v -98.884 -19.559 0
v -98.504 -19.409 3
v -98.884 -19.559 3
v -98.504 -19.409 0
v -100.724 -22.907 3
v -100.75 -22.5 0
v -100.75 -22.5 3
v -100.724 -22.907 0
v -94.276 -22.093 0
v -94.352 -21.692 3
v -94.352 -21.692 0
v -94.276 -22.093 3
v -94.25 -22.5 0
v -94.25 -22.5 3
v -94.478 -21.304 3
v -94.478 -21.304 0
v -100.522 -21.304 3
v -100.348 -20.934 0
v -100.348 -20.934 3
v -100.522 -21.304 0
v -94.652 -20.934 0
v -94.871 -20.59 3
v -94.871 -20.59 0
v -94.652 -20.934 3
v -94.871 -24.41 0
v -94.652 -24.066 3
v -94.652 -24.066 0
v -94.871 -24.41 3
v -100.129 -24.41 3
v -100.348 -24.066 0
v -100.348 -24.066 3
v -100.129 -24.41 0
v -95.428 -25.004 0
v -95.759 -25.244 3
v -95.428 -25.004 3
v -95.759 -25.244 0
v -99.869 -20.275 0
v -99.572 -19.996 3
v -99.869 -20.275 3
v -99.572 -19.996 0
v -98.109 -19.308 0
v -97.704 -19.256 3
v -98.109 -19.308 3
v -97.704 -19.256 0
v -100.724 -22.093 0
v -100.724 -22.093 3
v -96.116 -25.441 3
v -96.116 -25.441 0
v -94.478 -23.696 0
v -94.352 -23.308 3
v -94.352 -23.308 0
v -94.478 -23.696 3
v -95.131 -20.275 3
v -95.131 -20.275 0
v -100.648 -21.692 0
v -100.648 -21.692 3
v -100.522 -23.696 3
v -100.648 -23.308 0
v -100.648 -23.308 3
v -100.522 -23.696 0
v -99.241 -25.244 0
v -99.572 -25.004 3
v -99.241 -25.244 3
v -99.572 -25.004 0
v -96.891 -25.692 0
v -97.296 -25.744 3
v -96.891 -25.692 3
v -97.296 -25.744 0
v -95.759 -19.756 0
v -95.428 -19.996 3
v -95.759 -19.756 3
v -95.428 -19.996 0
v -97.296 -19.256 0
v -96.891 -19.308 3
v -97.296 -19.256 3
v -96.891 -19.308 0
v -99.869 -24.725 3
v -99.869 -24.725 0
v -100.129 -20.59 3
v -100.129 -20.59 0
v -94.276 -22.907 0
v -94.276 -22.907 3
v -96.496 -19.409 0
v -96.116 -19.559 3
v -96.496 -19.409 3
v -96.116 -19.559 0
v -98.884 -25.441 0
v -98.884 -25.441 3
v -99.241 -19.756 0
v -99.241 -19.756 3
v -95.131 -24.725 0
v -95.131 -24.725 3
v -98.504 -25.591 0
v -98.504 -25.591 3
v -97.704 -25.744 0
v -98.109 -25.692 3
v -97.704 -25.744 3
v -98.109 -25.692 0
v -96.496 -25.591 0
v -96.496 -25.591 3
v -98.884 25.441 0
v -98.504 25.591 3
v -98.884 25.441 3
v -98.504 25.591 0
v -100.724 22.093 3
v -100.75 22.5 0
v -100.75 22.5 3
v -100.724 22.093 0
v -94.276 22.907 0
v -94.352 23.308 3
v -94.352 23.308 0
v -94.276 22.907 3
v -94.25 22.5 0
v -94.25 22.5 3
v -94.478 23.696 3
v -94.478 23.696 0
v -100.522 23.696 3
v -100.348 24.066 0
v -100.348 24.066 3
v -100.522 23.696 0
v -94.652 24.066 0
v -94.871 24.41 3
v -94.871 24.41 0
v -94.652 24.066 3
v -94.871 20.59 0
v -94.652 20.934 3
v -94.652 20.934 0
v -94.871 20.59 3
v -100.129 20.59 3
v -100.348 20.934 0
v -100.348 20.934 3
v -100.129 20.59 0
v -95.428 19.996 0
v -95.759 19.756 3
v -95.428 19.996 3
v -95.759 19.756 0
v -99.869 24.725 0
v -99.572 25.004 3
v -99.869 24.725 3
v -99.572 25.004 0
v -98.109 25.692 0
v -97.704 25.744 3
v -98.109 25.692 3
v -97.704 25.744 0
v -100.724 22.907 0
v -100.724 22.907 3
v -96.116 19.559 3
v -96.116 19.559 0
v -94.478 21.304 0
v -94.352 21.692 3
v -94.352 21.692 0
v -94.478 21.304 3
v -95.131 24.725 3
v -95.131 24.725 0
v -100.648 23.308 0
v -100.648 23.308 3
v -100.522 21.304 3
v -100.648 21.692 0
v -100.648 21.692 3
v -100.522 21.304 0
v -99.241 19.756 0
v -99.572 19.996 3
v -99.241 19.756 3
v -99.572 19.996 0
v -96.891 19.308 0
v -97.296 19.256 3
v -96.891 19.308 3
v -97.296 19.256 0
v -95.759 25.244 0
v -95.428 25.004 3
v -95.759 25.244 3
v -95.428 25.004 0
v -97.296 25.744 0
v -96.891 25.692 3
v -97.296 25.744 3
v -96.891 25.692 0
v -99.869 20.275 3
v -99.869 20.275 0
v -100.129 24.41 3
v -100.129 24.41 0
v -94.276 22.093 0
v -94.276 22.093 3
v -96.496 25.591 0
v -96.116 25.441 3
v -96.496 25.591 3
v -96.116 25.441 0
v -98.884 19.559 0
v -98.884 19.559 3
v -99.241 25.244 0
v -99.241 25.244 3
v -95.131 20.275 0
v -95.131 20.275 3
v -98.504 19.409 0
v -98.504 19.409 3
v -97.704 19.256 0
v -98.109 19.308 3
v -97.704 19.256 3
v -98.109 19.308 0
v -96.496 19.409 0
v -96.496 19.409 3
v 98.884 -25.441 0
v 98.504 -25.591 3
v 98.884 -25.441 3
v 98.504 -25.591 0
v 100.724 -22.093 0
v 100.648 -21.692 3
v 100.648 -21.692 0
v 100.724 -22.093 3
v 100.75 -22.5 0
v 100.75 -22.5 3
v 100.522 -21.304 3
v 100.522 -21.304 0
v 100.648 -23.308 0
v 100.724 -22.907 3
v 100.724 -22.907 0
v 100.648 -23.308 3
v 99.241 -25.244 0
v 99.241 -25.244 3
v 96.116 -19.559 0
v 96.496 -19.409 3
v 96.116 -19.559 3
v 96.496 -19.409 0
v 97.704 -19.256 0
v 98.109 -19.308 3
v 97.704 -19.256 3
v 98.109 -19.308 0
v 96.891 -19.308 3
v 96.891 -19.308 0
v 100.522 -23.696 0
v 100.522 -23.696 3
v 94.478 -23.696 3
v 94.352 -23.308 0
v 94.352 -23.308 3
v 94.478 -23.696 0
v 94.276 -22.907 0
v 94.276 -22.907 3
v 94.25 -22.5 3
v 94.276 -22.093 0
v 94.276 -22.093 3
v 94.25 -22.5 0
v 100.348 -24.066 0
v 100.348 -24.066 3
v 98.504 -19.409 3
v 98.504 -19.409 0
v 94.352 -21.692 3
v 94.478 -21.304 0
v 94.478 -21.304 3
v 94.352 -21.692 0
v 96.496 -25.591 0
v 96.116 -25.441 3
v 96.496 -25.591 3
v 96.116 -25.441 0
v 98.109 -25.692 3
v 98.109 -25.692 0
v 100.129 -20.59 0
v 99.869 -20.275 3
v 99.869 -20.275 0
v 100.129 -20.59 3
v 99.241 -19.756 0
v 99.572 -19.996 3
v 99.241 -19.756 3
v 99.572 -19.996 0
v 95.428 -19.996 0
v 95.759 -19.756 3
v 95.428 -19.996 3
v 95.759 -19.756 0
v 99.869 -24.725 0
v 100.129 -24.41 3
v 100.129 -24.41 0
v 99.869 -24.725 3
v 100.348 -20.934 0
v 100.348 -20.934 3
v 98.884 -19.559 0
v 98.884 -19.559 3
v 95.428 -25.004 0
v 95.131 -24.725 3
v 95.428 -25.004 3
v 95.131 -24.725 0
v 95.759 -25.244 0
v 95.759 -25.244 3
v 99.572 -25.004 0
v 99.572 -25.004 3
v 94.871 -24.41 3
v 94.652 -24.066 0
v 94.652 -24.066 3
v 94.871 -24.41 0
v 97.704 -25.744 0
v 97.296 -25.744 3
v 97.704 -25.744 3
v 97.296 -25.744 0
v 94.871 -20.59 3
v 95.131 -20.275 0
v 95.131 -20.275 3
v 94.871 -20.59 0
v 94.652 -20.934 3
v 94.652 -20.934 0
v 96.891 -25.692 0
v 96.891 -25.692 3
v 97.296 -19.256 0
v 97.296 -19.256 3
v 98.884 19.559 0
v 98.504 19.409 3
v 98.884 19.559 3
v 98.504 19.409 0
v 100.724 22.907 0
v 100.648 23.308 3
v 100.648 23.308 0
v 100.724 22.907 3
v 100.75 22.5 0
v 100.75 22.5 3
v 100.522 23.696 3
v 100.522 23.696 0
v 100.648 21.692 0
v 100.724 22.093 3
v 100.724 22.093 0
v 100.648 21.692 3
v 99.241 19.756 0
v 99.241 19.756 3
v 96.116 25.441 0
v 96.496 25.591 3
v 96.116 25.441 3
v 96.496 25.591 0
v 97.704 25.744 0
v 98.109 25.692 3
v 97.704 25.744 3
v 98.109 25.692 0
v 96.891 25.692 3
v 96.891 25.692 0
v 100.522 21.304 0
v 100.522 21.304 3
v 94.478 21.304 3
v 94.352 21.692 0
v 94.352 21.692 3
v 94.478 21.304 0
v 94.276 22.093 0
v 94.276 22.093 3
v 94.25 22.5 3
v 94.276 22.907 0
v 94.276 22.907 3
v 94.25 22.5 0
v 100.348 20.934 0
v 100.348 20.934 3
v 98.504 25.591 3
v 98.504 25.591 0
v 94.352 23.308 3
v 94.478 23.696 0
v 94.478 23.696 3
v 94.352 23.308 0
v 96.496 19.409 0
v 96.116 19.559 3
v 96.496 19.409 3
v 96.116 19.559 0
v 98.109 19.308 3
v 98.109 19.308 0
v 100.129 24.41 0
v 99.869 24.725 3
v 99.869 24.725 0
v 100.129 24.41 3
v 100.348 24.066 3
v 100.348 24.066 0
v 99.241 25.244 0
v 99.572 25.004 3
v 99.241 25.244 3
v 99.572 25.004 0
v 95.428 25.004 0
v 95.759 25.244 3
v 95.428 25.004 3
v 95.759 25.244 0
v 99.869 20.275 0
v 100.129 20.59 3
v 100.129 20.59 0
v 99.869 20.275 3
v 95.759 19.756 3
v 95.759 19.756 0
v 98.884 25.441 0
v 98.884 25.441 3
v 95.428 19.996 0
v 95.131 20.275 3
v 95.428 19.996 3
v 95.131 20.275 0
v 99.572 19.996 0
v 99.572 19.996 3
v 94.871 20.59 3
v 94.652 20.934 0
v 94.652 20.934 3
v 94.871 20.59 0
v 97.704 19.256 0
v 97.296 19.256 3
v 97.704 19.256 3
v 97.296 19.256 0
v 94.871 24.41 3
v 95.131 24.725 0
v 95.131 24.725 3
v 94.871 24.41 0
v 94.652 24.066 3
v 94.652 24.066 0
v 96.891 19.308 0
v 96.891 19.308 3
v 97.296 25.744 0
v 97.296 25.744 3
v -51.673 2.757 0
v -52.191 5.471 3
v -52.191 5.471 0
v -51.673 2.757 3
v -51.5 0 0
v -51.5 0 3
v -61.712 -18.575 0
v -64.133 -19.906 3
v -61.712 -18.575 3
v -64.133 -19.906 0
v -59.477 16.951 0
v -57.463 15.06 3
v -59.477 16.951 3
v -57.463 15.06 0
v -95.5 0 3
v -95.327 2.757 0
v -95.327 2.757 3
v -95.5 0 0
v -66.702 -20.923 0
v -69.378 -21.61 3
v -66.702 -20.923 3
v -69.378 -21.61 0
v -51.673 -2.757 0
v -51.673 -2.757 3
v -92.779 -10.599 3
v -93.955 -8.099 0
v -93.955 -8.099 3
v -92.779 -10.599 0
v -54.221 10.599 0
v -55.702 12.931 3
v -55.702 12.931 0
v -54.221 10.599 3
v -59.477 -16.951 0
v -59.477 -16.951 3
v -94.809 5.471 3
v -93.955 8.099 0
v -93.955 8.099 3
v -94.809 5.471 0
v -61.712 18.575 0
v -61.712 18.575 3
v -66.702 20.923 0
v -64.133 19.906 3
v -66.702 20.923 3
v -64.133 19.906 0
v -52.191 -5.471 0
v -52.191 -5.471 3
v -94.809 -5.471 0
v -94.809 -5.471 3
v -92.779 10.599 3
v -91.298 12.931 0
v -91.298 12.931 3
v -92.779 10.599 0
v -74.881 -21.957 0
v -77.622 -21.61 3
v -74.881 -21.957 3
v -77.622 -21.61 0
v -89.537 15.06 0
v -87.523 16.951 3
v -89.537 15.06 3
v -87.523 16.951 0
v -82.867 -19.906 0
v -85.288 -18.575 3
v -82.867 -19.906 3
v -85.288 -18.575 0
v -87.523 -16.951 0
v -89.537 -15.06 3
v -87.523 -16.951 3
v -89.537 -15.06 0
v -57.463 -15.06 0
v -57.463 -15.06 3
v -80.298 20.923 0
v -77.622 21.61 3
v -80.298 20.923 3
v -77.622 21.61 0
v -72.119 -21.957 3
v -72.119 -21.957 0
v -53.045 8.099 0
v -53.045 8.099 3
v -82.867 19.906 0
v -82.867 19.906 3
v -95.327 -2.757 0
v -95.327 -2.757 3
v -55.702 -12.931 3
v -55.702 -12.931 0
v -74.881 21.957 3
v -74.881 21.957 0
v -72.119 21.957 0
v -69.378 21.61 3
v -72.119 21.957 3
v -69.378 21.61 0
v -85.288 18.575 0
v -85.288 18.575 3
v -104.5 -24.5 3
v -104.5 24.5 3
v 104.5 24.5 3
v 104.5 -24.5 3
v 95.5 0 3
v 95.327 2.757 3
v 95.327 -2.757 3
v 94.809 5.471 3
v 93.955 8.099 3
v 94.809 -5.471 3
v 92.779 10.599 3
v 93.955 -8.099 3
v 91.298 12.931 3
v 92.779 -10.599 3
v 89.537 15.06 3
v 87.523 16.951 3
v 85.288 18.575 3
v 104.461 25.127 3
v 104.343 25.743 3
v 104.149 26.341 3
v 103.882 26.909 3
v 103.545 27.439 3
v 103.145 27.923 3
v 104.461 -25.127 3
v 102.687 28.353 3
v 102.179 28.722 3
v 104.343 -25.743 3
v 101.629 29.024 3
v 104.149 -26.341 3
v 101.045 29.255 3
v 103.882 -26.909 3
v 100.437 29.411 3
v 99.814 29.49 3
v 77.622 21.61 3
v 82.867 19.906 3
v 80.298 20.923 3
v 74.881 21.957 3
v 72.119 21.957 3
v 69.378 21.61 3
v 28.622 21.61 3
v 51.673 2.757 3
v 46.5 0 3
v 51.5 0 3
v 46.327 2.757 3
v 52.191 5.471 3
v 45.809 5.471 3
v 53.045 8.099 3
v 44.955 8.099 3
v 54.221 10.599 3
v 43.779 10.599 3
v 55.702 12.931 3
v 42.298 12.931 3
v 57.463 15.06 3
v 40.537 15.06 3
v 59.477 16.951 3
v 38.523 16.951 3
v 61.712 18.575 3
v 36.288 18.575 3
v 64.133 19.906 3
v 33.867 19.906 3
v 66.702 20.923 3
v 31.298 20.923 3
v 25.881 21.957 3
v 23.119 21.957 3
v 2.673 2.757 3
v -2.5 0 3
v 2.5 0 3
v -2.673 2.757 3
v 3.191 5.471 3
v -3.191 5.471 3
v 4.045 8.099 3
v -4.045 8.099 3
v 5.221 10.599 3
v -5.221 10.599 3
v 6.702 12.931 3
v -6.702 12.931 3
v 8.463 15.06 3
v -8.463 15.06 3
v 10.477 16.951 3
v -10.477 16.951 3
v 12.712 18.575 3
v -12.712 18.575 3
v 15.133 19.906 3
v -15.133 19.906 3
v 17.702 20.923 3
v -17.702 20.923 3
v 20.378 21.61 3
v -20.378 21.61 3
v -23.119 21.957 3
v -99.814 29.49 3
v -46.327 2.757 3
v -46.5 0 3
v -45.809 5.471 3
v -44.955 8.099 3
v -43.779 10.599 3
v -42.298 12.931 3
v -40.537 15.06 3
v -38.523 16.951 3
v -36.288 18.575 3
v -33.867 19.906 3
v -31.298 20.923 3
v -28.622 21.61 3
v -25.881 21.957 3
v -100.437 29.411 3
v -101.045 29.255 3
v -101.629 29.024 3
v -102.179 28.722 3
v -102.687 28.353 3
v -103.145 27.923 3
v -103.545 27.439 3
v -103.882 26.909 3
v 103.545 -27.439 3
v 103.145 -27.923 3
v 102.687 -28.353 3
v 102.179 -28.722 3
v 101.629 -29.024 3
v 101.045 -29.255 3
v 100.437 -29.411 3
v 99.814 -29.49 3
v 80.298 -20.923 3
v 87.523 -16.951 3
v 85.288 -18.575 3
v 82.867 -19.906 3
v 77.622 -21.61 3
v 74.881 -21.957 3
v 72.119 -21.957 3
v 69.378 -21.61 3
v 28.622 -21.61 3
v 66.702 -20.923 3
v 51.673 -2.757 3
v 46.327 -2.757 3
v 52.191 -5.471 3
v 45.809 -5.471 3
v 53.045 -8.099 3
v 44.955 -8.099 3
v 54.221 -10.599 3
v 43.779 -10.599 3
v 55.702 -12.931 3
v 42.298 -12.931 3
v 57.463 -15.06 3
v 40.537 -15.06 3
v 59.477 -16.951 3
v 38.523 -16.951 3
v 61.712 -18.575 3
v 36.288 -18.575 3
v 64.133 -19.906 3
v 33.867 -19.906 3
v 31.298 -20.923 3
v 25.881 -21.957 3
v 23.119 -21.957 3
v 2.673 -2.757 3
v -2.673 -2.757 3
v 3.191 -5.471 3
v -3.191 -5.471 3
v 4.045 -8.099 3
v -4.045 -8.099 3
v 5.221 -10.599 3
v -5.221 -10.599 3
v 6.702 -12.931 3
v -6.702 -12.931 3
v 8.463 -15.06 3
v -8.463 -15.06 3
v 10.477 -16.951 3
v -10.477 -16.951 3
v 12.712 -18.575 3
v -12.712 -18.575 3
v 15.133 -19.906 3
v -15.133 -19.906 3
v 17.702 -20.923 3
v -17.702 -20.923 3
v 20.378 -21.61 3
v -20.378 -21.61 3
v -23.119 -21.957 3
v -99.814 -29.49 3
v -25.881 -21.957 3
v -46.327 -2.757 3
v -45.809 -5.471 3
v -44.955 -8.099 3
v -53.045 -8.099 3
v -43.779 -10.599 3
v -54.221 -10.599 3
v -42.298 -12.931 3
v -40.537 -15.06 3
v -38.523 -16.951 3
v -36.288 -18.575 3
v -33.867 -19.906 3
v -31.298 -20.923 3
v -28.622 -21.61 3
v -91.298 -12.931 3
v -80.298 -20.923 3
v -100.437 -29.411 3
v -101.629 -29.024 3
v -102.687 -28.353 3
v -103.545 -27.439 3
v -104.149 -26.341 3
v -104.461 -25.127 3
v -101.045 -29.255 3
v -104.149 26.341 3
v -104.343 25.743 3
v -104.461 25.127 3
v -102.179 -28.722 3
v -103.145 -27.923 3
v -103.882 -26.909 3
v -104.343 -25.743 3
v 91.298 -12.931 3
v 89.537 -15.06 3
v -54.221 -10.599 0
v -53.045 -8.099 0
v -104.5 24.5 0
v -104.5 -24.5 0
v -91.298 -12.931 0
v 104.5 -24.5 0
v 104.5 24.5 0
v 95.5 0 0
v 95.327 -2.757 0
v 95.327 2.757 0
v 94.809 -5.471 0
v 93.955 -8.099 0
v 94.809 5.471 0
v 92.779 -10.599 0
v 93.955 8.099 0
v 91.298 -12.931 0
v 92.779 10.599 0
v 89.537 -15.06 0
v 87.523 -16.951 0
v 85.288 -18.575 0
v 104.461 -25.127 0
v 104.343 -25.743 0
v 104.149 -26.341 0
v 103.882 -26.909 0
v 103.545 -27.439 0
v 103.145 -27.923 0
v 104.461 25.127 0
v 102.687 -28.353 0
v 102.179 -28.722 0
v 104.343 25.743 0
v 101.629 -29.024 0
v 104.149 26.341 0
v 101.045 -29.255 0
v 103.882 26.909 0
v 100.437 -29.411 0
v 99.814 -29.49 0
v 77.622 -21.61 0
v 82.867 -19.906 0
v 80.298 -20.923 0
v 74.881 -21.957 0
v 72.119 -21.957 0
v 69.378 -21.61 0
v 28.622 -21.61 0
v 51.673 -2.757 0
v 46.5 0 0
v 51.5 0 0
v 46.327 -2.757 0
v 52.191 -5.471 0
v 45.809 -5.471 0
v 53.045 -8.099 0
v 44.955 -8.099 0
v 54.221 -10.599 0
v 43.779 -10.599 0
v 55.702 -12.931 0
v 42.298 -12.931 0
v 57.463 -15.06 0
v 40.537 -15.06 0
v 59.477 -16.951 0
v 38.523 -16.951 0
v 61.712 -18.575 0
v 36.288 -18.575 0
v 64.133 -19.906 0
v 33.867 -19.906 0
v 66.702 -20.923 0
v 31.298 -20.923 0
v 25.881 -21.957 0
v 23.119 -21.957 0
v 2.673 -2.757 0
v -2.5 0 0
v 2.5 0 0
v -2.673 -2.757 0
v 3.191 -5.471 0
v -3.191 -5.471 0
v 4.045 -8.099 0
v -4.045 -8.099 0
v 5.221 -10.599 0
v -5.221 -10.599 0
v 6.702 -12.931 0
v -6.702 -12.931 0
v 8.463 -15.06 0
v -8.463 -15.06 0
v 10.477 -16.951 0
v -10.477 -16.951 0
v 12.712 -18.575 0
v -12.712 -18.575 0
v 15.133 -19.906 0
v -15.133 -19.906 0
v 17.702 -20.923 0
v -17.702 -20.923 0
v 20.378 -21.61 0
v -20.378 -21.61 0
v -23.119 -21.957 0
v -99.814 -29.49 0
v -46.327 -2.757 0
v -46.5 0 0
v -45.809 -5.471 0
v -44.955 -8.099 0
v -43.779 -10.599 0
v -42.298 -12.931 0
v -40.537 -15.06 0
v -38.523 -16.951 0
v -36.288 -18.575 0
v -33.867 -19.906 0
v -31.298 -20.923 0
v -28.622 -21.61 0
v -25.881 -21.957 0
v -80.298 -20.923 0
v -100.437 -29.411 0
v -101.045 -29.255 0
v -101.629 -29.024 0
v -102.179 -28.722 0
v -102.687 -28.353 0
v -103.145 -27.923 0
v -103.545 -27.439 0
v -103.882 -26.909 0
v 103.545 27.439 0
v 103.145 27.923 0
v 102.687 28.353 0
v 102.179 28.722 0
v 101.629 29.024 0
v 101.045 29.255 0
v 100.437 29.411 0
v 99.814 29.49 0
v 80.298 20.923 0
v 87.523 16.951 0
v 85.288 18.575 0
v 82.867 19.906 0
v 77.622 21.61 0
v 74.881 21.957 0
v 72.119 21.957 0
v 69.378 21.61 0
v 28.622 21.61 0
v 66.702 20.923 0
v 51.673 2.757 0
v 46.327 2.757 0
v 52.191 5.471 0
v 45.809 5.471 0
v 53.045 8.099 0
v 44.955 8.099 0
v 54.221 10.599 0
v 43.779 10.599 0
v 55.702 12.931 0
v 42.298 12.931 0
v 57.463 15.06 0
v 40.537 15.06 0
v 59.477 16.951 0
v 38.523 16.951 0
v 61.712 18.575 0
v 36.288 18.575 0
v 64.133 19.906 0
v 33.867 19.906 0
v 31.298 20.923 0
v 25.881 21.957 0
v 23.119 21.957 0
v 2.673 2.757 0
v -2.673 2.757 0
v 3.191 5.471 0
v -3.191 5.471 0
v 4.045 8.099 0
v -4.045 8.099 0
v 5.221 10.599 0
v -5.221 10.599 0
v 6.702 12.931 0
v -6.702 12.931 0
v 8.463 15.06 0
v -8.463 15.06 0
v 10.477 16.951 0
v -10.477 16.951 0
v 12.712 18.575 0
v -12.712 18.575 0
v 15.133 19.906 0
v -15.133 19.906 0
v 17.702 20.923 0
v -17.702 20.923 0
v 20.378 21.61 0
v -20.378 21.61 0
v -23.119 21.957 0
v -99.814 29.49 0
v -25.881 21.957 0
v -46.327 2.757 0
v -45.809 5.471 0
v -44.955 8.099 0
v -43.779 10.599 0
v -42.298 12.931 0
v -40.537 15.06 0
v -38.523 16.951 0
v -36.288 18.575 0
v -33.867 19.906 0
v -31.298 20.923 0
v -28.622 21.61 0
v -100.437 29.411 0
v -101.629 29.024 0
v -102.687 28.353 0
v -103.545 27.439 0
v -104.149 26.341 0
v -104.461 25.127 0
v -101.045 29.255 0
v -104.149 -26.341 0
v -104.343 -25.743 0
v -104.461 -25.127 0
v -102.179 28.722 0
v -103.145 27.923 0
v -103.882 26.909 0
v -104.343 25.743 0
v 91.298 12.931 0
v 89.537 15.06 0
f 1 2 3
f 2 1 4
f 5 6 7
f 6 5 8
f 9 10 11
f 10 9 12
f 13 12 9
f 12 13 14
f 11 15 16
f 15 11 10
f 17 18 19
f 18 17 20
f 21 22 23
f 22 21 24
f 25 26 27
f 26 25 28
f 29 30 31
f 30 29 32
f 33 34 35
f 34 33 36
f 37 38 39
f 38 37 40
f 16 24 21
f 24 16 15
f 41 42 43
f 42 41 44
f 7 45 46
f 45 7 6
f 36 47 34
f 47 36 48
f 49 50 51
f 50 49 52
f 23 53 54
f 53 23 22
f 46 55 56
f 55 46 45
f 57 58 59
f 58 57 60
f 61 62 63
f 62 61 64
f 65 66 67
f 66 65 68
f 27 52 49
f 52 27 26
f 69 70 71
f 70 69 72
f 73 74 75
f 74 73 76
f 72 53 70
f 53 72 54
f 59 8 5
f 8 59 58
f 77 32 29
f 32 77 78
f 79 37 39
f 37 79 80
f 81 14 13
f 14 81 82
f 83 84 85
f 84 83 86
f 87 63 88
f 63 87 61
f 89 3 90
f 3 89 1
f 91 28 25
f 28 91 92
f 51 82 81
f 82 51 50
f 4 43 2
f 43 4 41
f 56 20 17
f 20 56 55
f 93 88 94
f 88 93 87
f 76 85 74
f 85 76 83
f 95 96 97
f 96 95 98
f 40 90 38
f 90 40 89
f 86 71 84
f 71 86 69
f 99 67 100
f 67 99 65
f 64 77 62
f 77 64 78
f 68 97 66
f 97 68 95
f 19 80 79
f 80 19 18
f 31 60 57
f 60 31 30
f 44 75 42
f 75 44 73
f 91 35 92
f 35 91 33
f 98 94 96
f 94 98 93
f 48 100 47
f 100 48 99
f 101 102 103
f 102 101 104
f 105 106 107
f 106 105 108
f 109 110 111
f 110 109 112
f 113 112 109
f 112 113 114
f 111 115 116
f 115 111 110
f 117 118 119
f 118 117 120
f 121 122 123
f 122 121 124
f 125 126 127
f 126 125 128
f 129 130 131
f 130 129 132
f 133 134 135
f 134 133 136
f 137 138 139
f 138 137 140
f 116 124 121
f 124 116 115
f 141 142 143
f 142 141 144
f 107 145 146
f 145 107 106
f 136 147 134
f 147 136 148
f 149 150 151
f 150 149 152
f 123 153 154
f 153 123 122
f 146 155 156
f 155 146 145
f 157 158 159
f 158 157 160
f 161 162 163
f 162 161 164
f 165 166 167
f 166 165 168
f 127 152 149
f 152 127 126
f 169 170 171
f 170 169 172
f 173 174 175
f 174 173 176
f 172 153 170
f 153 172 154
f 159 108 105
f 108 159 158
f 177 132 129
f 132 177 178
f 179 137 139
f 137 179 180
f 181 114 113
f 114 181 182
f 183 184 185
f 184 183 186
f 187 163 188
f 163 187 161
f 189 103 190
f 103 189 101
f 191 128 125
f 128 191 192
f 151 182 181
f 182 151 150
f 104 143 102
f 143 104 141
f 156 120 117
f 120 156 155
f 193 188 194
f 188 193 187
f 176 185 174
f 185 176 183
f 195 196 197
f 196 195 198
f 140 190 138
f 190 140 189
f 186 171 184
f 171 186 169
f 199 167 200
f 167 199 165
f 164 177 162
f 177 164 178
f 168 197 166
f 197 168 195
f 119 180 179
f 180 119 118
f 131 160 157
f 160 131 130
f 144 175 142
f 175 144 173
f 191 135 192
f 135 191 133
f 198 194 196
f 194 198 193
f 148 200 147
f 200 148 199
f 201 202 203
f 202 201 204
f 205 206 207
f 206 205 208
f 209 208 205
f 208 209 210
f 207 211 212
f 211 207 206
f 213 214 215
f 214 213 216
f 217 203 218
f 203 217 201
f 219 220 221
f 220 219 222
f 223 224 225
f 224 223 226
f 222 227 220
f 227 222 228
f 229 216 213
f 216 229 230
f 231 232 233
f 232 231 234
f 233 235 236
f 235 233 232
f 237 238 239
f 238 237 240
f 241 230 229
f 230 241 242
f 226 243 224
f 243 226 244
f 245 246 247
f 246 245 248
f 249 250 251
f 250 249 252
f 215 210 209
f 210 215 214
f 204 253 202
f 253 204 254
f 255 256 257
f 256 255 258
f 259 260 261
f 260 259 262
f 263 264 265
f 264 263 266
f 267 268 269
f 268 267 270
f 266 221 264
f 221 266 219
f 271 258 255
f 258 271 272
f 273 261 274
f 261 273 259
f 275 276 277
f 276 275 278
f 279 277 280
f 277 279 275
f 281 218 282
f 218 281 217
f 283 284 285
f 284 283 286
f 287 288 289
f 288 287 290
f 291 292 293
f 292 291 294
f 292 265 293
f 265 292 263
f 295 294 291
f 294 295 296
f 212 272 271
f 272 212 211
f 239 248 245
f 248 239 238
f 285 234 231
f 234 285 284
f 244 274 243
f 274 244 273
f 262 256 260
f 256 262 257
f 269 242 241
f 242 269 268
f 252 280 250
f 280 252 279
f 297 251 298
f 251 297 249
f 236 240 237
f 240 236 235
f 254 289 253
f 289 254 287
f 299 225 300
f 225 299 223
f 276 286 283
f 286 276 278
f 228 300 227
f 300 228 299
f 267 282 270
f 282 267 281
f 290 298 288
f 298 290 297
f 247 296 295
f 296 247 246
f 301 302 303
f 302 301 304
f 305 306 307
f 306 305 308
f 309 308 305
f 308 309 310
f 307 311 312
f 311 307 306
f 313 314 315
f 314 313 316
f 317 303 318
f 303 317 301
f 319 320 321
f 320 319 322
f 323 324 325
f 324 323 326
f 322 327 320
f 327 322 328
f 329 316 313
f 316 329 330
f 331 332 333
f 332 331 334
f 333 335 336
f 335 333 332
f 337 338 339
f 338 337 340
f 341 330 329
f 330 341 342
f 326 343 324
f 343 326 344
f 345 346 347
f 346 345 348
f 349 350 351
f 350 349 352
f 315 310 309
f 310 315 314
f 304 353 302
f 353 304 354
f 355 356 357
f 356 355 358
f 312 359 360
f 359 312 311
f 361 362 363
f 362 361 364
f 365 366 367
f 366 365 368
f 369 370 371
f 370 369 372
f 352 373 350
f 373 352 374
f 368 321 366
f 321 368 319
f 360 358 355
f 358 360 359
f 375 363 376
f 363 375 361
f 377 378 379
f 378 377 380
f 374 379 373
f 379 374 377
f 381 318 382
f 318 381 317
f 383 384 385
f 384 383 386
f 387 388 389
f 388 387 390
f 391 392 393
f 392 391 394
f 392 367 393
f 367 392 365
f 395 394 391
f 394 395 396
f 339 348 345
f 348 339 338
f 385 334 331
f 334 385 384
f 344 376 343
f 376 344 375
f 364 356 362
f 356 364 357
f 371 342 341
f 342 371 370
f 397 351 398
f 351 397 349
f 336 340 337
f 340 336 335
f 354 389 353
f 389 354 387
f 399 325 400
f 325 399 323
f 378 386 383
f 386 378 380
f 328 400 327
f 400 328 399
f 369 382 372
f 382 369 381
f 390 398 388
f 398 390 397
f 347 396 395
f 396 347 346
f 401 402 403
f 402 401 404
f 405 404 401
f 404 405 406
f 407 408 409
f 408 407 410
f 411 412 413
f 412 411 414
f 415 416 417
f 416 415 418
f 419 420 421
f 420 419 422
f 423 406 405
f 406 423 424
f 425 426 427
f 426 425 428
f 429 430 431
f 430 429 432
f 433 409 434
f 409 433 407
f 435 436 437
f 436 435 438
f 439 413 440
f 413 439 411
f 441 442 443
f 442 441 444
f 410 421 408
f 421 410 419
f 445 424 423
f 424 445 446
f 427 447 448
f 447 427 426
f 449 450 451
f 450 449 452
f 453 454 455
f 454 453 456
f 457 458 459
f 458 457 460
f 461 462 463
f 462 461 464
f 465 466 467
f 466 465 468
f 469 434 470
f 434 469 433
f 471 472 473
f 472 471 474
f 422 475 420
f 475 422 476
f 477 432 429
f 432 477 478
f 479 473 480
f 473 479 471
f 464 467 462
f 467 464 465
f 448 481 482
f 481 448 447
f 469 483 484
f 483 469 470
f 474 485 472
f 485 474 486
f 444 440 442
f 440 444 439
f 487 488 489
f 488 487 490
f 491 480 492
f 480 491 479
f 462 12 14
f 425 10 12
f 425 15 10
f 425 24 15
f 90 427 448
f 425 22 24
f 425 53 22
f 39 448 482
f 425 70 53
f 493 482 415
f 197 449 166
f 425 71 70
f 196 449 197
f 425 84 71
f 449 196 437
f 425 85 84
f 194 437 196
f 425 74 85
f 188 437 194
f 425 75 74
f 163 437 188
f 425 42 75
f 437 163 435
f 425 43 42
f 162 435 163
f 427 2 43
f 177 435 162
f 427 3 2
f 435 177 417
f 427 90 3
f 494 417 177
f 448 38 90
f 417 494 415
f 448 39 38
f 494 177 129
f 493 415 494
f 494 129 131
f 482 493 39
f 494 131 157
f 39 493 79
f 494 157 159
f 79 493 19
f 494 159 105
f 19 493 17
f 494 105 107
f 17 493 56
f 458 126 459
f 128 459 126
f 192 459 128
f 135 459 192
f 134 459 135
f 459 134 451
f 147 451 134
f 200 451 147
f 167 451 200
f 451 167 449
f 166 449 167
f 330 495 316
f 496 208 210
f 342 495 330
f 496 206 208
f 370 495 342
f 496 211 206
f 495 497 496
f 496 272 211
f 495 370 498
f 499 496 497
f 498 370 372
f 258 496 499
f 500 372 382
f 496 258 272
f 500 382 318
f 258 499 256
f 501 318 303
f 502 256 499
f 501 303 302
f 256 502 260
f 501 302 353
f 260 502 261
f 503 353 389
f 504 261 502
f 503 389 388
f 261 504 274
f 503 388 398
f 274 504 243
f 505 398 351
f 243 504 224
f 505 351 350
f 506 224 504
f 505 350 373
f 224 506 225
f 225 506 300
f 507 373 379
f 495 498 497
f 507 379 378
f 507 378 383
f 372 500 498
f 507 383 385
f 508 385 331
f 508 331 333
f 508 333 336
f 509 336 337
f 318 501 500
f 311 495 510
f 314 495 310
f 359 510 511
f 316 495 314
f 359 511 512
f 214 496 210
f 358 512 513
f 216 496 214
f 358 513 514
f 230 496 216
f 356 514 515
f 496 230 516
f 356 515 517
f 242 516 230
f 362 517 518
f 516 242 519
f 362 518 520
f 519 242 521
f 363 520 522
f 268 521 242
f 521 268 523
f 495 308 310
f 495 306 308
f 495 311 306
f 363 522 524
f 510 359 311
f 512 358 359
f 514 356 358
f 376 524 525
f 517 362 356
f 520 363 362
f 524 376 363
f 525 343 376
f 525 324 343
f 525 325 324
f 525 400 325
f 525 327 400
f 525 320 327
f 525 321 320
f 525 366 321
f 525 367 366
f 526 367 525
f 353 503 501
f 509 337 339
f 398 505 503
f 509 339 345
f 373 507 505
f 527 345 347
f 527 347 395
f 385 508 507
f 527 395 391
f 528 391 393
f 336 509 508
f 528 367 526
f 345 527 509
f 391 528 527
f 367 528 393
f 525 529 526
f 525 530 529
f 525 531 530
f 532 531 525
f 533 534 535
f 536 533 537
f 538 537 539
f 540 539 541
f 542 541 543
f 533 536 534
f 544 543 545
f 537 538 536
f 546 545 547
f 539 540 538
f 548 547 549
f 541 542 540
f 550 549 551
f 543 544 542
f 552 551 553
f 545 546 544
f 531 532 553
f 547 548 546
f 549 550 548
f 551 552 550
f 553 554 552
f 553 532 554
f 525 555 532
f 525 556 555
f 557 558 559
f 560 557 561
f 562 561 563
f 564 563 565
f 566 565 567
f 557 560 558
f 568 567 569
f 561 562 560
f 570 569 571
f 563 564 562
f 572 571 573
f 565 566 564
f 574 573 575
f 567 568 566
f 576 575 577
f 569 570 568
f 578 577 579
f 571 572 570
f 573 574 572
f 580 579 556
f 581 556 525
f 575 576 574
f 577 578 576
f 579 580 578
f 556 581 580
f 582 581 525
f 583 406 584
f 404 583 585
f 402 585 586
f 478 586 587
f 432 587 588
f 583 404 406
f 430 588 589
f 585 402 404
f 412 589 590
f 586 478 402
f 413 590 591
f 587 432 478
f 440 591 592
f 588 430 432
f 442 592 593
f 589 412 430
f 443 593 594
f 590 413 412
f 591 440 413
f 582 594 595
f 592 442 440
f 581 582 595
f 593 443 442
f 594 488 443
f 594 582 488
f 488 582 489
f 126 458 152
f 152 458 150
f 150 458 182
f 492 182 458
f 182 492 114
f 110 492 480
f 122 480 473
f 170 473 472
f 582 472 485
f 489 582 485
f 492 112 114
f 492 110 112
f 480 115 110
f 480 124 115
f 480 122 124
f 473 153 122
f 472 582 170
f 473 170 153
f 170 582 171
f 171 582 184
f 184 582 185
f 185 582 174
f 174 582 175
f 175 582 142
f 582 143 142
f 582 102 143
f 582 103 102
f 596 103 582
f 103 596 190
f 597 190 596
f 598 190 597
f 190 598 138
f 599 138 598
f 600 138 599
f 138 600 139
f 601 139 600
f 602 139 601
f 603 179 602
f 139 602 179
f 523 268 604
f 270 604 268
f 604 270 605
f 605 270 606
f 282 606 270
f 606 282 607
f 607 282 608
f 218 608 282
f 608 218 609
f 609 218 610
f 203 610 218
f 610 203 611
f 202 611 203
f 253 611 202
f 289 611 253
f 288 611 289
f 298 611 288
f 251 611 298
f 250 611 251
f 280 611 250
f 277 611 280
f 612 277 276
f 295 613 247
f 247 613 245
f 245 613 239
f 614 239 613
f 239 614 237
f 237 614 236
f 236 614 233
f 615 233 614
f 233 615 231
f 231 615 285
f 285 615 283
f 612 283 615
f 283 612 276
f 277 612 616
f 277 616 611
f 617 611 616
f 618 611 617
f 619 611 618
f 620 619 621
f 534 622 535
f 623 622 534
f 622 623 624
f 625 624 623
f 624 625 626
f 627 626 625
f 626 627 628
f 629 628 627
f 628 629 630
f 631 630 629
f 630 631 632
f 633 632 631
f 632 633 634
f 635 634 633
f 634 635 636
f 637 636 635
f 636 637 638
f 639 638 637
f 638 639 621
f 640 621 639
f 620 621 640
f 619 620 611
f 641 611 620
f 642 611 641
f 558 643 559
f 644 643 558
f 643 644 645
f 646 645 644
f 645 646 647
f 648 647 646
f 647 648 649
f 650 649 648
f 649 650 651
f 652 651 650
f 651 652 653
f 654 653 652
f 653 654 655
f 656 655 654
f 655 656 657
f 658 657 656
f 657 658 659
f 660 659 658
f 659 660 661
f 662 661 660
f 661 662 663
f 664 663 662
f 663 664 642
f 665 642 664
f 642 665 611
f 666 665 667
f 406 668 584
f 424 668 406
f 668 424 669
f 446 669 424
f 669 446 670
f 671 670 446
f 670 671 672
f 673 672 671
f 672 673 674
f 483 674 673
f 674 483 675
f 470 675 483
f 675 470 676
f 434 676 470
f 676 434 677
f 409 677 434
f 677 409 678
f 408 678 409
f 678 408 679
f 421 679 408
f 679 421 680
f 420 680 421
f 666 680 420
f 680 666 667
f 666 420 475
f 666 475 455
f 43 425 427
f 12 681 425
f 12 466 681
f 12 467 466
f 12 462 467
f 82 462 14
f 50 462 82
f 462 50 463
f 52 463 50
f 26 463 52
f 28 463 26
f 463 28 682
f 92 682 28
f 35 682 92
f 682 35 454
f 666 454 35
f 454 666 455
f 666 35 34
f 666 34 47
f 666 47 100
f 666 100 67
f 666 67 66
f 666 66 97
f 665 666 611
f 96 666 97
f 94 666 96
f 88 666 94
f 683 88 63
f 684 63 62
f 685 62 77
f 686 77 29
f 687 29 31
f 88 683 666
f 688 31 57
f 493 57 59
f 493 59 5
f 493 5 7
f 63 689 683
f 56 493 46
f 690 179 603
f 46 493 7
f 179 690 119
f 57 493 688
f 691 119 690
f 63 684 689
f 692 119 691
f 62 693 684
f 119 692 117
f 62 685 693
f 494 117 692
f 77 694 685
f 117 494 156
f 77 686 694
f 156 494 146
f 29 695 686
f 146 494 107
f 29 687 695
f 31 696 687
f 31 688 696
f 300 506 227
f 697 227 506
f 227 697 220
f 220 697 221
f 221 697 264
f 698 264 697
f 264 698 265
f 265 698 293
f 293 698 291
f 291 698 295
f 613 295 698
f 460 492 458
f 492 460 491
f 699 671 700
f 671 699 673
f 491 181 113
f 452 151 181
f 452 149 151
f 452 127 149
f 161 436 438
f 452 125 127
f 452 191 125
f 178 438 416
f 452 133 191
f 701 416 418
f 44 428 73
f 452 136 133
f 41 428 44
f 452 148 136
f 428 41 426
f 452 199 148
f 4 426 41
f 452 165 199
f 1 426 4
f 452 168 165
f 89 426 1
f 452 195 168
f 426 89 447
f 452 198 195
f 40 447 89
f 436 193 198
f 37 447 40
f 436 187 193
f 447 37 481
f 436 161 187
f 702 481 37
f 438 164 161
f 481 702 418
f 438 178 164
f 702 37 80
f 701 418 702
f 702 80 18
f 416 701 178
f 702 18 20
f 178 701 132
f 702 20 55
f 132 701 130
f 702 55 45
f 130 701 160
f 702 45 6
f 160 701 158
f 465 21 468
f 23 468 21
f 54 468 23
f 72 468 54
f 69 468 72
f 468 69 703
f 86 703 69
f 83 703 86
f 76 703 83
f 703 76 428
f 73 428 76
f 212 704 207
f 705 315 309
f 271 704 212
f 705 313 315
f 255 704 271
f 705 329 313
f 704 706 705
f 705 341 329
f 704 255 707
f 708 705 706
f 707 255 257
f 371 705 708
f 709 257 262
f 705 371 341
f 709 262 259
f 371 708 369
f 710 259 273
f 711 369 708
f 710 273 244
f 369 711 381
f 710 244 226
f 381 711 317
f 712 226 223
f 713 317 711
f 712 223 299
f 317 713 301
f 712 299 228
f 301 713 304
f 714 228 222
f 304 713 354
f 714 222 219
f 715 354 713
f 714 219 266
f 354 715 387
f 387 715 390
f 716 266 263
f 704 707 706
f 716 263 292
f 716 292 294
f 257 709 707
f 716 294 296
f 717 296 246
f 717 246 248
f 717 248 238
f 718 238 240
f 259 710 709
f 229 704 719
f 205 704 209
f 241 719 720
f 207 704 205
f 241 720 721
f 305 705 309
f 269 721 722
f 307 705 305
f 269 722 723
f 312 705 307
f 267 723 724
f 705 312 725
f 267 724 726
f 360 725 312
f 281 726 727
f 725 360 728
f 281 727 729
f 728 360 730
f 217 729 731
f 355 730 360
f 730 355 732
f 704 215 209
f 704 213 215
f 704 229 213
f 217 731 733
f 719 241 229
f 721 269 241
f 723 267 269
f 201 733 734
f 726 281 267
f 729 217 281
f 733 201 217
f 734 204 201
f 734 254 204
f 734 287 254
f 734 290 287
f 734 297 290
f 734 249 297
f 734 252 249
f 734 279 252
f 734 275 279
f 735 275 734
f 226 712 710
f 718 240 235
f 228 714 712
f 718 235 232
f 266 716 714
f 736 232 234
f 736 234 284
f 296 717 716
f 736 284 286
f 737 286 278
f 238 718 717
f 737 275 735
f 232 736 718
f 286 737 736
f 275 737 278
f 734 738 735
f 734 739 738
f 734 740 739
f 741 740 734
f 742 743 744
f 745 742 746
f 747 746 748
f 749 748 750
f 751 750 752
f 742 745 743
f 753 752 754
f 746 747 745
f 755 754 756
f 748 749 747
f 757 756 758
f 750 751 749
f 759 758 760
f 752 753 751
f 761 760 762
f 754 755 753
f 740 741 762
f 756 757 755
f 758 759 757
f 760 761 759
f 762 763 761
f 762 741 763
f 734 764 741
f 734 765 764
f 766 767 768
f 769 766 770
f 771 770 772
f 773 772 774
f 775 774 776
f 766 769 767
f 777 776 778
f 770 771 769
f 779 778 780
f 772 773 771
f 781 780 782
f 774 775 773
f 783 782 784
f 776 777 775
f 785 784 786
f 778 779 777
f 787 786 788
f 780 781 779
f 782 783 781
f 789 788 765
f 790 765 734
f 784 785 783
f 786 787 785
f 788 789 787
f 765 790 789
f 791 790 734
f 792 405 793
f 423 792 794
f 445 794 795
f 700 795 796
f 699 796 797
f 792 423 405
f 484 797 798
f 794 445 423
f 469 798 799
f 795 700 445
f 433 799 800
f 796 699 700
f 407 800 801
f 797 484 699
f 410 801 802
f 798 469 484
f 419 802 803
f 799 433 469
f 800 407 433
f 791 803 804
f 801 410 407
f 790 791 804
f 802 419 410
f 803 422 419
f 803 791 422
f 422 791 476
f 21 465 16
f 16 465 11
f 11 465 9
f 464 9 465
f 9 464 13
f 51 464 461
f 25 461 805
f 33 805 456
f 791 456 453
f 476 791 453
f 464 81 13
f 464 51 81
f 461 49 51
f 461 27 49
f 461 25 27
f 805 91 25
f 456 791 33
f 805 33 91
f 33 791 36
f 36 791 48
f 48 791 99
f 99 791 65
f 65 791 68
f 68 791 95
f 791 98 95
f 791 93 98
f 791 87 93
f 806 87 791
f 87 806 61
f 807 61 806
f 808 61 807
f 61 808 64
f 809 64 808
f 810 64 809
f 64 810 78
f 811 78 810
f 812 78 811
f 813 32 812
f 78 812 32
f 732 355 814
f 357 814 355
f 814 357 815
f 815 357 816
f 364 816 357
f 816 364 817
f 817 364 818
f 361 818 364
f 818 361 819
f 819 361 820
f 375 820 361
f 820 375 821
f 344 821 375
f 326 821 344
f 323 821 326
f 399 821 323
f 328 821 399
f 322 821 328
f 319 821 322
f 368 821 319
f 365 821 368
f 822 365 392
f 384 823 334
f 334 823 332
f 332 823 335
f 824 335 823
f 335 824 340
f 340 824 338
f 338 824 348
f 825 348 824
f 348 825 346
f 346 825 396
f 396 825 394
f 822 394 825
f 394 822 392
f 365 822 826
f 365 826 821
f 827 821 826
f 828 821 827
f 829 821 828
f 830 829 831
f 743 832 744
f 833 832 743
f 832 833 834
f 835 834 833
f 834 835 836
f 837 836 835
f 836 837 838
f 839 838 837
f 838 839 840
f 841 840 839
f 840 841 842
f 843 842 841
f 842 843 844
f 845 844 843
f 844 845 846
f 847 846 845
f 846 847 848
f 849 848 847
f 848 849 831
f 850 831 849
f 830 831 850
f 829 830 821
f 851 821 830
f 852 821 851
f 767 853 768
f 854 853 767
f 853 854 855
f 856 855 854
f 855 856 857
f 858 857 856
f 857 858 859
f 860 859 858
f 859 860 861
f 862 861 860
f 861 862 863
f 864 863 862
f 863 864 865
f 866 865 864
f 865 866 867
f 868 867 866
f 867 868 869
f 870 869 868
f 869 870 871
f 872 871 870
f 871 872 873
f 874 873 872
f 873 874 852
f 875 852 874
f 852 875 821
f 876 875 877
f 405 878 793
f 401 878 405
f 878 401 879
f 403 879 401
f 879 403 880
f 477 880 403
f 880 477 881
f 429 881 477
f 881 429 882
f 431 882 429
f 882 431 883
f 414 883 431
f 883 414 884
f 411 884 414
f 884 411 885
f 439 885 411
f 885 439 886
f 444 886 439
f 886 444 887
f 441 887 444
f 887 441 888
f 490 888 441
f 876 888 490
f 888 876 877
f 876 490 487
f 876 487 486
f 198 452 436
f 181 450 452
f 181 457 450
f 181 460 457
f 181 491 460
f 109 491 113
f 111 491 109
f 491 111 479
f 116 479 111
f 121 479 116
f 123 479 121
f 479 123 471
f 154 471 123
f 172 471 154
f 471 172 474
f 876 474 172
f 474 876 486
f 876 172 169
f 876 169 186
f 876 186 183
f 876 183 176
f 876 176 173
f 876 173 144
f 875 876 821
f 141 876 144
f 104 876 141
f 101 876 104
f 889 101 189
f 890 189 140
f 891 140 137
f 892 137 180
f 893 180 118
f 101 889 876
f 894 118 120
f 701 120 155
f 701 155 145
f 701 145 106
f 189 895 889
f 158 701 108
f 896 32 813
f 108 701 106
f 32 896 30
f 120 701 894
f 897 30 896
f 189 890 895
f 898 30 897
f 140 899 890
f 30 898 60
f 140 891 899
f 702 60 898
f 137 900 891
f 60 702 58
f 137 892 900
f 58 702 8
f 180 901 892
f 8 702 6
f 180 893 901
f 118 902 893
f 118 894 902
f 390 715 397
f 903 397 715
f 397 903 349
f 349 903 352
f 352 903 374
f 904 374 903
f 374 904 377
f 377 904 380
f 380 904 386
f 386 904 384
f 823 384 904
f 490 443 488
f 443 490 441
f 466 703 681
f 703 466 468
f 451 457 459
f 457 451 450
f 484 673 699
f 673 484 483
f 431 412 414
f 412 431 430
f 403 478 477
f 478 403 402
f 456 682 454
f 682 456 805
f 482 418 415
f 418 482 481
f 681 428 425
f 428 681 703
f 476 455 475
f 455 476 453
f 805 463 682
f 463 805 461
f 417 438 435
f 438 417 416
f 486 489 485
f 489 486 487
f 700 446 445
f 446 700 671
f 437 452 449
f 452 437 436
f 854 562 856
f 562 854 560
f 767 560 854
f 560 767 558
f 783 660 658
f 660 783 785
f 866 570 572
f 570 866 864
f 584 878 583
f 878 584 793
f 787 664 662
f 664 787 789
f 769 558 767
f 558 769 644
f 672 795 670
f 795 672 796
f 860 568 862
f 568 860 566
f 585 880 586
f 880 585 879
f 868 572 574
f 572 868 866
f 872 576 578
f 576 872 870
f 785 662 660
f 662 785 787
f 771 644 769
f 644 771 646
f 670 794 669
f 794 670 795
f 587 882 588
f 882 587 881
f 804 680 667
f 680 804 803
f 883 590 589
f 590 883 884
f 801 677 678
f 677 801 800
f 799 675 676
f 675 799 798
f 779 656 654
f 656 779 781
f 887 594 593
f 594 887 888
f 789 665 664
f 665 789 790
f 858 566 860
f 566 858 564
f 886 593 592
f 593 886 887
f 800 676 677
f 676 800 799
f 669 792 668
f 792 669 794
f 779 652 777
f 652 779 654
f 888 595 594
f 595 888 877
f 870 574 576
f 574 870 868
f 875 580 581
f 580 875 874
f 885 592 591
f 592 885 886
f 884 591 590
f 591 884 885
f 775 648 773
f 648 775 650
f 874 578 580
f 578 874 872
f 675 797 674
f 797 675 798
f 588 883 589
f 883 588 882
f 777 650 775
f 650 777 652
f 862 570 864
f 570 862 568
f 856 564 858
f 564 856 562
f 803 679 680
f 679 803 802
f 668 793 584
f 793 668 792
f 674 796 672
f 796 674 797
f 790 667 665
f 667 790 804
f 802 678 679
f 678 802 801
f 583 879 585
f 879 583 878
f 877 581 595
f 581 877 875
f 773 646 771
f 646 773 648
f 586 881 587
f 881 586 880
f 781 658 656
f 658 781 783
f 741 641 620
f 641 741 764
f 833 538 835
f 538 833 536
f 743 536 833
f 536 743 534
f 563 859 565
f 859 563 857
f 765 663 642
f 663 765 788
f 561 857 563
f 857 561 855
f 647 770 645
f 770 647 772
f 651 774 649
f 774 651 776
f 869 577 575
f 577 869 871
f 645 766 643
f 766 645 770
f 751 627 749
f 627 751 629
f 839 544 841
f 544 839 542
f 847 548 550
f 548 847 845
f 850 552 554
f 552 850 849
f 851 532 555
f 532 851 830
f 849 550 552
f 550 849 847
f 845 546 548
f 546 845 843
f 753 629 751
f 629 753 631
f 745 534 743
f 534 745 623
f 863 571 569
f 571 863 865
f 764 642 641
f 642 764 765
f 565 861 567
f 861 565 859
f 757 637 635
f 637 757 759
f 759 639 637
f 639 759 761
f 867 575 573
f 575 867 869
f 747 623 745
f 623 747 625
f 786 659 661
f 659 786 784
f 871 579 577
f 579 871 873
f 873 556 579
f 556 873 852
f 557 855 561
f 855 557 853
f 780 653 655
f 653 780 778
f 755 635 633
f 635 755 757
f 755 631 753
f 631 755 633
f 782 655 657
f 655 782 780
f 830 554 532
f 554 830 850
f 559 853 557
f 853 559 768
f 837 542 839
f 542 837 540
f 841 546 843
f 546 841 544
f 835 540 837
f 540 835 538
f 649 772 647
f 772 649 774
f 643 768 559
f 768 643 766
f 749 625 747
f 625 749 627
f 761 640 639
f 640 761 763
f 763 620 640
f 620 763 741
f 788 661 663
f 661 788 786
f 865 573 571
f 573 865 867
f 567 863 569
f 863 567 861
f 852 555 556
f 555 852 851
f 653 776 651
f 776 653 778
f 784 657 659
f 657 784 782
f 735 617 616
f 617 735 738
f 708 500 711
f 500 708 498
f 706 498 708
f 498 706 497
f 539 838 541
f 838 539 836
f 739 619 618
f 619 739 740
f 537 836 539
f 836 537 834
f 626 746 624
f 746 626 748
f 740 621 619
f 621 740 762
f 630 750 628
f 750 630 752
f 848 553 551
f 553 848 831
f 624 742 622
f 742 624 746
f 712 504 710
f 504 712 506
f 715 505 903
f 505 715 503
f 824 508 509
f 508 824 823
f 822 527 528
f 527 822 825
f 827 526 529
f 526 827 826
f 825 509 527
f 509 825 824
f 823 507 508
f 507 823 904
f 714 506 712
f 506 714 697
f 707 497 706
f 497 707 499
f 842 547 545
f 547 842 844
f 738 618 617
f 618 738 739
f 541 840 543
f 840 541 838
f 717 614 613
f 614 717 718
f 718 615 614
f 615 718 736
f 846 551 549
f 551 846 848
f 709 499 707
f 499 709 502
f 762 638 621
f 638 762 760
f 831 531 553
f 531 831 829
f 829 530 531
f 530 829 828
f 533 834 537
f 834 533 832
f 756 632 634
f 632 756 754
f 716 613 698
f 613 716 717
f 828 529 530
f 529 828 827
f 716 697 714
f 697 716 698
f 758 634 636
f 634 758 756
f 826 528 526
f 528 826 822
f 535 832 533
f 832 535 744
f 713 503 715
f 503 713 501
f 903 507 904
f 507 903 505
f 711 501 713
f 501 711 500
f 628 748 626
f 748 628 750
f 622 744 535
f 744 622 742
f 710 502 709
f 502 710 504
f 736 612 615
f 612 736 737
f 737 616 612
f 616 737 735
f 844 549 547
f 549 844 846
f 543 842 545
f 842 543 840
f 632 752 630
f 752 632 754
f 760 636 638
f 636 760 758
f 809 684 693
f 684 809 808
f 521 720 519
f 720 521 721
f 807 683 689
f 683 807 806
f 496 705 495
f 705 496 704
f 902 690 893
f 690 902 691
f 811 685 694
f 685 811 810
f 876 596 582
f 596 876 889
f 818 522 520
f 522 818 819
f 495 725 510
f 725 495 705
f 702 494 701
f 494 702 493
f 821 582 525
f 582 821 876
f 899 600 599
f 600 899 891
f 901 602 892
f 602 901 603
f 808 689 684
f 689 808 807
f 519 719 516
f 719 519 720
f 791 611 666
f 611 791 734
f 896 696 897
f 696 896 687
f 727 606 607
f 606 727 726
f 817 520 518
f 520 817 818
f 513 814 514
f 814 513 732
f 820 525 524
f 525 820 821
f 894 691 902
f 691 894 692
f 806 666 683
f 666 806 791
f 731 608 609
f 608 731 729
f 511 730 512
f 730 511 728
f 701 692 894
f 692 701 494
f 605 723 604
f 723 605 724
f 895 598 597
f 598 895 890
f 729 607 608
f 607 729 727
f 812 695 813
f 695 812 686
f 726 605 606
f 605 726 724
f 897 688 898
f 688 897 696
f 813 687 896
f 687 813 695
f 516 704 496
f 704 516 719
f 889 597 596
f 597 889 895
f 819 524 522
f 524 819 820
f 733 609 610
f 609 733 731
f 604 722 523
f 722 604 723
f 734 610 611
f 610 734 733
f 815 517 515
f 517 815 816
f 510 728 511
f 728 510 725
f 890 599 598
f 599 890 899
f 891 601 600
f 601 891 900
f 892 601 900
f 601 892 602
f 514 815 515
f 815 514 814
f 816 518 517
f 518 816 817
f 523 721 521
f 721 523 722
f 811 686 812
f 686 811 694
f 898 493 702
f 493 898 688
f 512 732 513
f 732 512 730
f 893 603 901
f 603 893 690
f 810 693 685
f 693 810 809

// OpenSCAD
$fn = 50;

difference() {
	union() {
		hull() {
			translate(v = [-99.5, 24.5, 0]) {
				cylinder(h = 3, r = 5);
			}
			translate(v = [99.5, 24.5, 0]) {
				cylinder(h = 3, r = 5);
			}
			translate(v = [-99.5, -24.5, 0]) {
				cylinder(h = 3, r = 5);
			}
			translate(v = [99.5, -24.5, 0]) {
				cylinder(h = 3, r = 5);
			}
		}
	}
	union() {
		translate(v = [-97.5, -22.5, -100.0]) {
			cylinder(h = 200, r = 3.25);
		}
		translate(v = [-97.5, 22.5, -100.0]) {
			cylinder(h = 200, r = 3.25);
		}
		translate(v = [97.5, -22.5, -100.0]) {
			cylinder(h = 200, r = 3.25);
		}
		translate(v = [97.5, 22.5, -100.0]) {
			cylinder(h = 200, r = 3.25);
		}
		translate(v = [-97.5, -22.5, -100.0]) {
			cylinder(h = 200, r = 1.8);
		}
		translate(v = [-97.5, 22.5, -100.0]) {
			cylinder(h = 200, r = 1.8);
		}
		translate(v = [97.5, -22.5, -100.0]) {
			cylinder(h = 200, r = 1.8);
		}
		translate(v = [97.5, 22.5, -100.0]) {
			cylinder(h = 200, r = 1.8);
		}
		translate(v = [-73.5, 0, 0.0]) {
			cylinder(h = 3, r = 22.0);
		}
		translate(v = [-24.5, 0, 0.0]) {
			cylinder(h = 3, r = 22.0);
		}
		translate(v = [24.5, 0, 0.0]) {
			cylinder(h = 3, r = 22.0);
		}
		translate(v = [73.5, 0, 0.0]) {
			cylinder(h = 3, r = 22.0);
		}
	}
}
